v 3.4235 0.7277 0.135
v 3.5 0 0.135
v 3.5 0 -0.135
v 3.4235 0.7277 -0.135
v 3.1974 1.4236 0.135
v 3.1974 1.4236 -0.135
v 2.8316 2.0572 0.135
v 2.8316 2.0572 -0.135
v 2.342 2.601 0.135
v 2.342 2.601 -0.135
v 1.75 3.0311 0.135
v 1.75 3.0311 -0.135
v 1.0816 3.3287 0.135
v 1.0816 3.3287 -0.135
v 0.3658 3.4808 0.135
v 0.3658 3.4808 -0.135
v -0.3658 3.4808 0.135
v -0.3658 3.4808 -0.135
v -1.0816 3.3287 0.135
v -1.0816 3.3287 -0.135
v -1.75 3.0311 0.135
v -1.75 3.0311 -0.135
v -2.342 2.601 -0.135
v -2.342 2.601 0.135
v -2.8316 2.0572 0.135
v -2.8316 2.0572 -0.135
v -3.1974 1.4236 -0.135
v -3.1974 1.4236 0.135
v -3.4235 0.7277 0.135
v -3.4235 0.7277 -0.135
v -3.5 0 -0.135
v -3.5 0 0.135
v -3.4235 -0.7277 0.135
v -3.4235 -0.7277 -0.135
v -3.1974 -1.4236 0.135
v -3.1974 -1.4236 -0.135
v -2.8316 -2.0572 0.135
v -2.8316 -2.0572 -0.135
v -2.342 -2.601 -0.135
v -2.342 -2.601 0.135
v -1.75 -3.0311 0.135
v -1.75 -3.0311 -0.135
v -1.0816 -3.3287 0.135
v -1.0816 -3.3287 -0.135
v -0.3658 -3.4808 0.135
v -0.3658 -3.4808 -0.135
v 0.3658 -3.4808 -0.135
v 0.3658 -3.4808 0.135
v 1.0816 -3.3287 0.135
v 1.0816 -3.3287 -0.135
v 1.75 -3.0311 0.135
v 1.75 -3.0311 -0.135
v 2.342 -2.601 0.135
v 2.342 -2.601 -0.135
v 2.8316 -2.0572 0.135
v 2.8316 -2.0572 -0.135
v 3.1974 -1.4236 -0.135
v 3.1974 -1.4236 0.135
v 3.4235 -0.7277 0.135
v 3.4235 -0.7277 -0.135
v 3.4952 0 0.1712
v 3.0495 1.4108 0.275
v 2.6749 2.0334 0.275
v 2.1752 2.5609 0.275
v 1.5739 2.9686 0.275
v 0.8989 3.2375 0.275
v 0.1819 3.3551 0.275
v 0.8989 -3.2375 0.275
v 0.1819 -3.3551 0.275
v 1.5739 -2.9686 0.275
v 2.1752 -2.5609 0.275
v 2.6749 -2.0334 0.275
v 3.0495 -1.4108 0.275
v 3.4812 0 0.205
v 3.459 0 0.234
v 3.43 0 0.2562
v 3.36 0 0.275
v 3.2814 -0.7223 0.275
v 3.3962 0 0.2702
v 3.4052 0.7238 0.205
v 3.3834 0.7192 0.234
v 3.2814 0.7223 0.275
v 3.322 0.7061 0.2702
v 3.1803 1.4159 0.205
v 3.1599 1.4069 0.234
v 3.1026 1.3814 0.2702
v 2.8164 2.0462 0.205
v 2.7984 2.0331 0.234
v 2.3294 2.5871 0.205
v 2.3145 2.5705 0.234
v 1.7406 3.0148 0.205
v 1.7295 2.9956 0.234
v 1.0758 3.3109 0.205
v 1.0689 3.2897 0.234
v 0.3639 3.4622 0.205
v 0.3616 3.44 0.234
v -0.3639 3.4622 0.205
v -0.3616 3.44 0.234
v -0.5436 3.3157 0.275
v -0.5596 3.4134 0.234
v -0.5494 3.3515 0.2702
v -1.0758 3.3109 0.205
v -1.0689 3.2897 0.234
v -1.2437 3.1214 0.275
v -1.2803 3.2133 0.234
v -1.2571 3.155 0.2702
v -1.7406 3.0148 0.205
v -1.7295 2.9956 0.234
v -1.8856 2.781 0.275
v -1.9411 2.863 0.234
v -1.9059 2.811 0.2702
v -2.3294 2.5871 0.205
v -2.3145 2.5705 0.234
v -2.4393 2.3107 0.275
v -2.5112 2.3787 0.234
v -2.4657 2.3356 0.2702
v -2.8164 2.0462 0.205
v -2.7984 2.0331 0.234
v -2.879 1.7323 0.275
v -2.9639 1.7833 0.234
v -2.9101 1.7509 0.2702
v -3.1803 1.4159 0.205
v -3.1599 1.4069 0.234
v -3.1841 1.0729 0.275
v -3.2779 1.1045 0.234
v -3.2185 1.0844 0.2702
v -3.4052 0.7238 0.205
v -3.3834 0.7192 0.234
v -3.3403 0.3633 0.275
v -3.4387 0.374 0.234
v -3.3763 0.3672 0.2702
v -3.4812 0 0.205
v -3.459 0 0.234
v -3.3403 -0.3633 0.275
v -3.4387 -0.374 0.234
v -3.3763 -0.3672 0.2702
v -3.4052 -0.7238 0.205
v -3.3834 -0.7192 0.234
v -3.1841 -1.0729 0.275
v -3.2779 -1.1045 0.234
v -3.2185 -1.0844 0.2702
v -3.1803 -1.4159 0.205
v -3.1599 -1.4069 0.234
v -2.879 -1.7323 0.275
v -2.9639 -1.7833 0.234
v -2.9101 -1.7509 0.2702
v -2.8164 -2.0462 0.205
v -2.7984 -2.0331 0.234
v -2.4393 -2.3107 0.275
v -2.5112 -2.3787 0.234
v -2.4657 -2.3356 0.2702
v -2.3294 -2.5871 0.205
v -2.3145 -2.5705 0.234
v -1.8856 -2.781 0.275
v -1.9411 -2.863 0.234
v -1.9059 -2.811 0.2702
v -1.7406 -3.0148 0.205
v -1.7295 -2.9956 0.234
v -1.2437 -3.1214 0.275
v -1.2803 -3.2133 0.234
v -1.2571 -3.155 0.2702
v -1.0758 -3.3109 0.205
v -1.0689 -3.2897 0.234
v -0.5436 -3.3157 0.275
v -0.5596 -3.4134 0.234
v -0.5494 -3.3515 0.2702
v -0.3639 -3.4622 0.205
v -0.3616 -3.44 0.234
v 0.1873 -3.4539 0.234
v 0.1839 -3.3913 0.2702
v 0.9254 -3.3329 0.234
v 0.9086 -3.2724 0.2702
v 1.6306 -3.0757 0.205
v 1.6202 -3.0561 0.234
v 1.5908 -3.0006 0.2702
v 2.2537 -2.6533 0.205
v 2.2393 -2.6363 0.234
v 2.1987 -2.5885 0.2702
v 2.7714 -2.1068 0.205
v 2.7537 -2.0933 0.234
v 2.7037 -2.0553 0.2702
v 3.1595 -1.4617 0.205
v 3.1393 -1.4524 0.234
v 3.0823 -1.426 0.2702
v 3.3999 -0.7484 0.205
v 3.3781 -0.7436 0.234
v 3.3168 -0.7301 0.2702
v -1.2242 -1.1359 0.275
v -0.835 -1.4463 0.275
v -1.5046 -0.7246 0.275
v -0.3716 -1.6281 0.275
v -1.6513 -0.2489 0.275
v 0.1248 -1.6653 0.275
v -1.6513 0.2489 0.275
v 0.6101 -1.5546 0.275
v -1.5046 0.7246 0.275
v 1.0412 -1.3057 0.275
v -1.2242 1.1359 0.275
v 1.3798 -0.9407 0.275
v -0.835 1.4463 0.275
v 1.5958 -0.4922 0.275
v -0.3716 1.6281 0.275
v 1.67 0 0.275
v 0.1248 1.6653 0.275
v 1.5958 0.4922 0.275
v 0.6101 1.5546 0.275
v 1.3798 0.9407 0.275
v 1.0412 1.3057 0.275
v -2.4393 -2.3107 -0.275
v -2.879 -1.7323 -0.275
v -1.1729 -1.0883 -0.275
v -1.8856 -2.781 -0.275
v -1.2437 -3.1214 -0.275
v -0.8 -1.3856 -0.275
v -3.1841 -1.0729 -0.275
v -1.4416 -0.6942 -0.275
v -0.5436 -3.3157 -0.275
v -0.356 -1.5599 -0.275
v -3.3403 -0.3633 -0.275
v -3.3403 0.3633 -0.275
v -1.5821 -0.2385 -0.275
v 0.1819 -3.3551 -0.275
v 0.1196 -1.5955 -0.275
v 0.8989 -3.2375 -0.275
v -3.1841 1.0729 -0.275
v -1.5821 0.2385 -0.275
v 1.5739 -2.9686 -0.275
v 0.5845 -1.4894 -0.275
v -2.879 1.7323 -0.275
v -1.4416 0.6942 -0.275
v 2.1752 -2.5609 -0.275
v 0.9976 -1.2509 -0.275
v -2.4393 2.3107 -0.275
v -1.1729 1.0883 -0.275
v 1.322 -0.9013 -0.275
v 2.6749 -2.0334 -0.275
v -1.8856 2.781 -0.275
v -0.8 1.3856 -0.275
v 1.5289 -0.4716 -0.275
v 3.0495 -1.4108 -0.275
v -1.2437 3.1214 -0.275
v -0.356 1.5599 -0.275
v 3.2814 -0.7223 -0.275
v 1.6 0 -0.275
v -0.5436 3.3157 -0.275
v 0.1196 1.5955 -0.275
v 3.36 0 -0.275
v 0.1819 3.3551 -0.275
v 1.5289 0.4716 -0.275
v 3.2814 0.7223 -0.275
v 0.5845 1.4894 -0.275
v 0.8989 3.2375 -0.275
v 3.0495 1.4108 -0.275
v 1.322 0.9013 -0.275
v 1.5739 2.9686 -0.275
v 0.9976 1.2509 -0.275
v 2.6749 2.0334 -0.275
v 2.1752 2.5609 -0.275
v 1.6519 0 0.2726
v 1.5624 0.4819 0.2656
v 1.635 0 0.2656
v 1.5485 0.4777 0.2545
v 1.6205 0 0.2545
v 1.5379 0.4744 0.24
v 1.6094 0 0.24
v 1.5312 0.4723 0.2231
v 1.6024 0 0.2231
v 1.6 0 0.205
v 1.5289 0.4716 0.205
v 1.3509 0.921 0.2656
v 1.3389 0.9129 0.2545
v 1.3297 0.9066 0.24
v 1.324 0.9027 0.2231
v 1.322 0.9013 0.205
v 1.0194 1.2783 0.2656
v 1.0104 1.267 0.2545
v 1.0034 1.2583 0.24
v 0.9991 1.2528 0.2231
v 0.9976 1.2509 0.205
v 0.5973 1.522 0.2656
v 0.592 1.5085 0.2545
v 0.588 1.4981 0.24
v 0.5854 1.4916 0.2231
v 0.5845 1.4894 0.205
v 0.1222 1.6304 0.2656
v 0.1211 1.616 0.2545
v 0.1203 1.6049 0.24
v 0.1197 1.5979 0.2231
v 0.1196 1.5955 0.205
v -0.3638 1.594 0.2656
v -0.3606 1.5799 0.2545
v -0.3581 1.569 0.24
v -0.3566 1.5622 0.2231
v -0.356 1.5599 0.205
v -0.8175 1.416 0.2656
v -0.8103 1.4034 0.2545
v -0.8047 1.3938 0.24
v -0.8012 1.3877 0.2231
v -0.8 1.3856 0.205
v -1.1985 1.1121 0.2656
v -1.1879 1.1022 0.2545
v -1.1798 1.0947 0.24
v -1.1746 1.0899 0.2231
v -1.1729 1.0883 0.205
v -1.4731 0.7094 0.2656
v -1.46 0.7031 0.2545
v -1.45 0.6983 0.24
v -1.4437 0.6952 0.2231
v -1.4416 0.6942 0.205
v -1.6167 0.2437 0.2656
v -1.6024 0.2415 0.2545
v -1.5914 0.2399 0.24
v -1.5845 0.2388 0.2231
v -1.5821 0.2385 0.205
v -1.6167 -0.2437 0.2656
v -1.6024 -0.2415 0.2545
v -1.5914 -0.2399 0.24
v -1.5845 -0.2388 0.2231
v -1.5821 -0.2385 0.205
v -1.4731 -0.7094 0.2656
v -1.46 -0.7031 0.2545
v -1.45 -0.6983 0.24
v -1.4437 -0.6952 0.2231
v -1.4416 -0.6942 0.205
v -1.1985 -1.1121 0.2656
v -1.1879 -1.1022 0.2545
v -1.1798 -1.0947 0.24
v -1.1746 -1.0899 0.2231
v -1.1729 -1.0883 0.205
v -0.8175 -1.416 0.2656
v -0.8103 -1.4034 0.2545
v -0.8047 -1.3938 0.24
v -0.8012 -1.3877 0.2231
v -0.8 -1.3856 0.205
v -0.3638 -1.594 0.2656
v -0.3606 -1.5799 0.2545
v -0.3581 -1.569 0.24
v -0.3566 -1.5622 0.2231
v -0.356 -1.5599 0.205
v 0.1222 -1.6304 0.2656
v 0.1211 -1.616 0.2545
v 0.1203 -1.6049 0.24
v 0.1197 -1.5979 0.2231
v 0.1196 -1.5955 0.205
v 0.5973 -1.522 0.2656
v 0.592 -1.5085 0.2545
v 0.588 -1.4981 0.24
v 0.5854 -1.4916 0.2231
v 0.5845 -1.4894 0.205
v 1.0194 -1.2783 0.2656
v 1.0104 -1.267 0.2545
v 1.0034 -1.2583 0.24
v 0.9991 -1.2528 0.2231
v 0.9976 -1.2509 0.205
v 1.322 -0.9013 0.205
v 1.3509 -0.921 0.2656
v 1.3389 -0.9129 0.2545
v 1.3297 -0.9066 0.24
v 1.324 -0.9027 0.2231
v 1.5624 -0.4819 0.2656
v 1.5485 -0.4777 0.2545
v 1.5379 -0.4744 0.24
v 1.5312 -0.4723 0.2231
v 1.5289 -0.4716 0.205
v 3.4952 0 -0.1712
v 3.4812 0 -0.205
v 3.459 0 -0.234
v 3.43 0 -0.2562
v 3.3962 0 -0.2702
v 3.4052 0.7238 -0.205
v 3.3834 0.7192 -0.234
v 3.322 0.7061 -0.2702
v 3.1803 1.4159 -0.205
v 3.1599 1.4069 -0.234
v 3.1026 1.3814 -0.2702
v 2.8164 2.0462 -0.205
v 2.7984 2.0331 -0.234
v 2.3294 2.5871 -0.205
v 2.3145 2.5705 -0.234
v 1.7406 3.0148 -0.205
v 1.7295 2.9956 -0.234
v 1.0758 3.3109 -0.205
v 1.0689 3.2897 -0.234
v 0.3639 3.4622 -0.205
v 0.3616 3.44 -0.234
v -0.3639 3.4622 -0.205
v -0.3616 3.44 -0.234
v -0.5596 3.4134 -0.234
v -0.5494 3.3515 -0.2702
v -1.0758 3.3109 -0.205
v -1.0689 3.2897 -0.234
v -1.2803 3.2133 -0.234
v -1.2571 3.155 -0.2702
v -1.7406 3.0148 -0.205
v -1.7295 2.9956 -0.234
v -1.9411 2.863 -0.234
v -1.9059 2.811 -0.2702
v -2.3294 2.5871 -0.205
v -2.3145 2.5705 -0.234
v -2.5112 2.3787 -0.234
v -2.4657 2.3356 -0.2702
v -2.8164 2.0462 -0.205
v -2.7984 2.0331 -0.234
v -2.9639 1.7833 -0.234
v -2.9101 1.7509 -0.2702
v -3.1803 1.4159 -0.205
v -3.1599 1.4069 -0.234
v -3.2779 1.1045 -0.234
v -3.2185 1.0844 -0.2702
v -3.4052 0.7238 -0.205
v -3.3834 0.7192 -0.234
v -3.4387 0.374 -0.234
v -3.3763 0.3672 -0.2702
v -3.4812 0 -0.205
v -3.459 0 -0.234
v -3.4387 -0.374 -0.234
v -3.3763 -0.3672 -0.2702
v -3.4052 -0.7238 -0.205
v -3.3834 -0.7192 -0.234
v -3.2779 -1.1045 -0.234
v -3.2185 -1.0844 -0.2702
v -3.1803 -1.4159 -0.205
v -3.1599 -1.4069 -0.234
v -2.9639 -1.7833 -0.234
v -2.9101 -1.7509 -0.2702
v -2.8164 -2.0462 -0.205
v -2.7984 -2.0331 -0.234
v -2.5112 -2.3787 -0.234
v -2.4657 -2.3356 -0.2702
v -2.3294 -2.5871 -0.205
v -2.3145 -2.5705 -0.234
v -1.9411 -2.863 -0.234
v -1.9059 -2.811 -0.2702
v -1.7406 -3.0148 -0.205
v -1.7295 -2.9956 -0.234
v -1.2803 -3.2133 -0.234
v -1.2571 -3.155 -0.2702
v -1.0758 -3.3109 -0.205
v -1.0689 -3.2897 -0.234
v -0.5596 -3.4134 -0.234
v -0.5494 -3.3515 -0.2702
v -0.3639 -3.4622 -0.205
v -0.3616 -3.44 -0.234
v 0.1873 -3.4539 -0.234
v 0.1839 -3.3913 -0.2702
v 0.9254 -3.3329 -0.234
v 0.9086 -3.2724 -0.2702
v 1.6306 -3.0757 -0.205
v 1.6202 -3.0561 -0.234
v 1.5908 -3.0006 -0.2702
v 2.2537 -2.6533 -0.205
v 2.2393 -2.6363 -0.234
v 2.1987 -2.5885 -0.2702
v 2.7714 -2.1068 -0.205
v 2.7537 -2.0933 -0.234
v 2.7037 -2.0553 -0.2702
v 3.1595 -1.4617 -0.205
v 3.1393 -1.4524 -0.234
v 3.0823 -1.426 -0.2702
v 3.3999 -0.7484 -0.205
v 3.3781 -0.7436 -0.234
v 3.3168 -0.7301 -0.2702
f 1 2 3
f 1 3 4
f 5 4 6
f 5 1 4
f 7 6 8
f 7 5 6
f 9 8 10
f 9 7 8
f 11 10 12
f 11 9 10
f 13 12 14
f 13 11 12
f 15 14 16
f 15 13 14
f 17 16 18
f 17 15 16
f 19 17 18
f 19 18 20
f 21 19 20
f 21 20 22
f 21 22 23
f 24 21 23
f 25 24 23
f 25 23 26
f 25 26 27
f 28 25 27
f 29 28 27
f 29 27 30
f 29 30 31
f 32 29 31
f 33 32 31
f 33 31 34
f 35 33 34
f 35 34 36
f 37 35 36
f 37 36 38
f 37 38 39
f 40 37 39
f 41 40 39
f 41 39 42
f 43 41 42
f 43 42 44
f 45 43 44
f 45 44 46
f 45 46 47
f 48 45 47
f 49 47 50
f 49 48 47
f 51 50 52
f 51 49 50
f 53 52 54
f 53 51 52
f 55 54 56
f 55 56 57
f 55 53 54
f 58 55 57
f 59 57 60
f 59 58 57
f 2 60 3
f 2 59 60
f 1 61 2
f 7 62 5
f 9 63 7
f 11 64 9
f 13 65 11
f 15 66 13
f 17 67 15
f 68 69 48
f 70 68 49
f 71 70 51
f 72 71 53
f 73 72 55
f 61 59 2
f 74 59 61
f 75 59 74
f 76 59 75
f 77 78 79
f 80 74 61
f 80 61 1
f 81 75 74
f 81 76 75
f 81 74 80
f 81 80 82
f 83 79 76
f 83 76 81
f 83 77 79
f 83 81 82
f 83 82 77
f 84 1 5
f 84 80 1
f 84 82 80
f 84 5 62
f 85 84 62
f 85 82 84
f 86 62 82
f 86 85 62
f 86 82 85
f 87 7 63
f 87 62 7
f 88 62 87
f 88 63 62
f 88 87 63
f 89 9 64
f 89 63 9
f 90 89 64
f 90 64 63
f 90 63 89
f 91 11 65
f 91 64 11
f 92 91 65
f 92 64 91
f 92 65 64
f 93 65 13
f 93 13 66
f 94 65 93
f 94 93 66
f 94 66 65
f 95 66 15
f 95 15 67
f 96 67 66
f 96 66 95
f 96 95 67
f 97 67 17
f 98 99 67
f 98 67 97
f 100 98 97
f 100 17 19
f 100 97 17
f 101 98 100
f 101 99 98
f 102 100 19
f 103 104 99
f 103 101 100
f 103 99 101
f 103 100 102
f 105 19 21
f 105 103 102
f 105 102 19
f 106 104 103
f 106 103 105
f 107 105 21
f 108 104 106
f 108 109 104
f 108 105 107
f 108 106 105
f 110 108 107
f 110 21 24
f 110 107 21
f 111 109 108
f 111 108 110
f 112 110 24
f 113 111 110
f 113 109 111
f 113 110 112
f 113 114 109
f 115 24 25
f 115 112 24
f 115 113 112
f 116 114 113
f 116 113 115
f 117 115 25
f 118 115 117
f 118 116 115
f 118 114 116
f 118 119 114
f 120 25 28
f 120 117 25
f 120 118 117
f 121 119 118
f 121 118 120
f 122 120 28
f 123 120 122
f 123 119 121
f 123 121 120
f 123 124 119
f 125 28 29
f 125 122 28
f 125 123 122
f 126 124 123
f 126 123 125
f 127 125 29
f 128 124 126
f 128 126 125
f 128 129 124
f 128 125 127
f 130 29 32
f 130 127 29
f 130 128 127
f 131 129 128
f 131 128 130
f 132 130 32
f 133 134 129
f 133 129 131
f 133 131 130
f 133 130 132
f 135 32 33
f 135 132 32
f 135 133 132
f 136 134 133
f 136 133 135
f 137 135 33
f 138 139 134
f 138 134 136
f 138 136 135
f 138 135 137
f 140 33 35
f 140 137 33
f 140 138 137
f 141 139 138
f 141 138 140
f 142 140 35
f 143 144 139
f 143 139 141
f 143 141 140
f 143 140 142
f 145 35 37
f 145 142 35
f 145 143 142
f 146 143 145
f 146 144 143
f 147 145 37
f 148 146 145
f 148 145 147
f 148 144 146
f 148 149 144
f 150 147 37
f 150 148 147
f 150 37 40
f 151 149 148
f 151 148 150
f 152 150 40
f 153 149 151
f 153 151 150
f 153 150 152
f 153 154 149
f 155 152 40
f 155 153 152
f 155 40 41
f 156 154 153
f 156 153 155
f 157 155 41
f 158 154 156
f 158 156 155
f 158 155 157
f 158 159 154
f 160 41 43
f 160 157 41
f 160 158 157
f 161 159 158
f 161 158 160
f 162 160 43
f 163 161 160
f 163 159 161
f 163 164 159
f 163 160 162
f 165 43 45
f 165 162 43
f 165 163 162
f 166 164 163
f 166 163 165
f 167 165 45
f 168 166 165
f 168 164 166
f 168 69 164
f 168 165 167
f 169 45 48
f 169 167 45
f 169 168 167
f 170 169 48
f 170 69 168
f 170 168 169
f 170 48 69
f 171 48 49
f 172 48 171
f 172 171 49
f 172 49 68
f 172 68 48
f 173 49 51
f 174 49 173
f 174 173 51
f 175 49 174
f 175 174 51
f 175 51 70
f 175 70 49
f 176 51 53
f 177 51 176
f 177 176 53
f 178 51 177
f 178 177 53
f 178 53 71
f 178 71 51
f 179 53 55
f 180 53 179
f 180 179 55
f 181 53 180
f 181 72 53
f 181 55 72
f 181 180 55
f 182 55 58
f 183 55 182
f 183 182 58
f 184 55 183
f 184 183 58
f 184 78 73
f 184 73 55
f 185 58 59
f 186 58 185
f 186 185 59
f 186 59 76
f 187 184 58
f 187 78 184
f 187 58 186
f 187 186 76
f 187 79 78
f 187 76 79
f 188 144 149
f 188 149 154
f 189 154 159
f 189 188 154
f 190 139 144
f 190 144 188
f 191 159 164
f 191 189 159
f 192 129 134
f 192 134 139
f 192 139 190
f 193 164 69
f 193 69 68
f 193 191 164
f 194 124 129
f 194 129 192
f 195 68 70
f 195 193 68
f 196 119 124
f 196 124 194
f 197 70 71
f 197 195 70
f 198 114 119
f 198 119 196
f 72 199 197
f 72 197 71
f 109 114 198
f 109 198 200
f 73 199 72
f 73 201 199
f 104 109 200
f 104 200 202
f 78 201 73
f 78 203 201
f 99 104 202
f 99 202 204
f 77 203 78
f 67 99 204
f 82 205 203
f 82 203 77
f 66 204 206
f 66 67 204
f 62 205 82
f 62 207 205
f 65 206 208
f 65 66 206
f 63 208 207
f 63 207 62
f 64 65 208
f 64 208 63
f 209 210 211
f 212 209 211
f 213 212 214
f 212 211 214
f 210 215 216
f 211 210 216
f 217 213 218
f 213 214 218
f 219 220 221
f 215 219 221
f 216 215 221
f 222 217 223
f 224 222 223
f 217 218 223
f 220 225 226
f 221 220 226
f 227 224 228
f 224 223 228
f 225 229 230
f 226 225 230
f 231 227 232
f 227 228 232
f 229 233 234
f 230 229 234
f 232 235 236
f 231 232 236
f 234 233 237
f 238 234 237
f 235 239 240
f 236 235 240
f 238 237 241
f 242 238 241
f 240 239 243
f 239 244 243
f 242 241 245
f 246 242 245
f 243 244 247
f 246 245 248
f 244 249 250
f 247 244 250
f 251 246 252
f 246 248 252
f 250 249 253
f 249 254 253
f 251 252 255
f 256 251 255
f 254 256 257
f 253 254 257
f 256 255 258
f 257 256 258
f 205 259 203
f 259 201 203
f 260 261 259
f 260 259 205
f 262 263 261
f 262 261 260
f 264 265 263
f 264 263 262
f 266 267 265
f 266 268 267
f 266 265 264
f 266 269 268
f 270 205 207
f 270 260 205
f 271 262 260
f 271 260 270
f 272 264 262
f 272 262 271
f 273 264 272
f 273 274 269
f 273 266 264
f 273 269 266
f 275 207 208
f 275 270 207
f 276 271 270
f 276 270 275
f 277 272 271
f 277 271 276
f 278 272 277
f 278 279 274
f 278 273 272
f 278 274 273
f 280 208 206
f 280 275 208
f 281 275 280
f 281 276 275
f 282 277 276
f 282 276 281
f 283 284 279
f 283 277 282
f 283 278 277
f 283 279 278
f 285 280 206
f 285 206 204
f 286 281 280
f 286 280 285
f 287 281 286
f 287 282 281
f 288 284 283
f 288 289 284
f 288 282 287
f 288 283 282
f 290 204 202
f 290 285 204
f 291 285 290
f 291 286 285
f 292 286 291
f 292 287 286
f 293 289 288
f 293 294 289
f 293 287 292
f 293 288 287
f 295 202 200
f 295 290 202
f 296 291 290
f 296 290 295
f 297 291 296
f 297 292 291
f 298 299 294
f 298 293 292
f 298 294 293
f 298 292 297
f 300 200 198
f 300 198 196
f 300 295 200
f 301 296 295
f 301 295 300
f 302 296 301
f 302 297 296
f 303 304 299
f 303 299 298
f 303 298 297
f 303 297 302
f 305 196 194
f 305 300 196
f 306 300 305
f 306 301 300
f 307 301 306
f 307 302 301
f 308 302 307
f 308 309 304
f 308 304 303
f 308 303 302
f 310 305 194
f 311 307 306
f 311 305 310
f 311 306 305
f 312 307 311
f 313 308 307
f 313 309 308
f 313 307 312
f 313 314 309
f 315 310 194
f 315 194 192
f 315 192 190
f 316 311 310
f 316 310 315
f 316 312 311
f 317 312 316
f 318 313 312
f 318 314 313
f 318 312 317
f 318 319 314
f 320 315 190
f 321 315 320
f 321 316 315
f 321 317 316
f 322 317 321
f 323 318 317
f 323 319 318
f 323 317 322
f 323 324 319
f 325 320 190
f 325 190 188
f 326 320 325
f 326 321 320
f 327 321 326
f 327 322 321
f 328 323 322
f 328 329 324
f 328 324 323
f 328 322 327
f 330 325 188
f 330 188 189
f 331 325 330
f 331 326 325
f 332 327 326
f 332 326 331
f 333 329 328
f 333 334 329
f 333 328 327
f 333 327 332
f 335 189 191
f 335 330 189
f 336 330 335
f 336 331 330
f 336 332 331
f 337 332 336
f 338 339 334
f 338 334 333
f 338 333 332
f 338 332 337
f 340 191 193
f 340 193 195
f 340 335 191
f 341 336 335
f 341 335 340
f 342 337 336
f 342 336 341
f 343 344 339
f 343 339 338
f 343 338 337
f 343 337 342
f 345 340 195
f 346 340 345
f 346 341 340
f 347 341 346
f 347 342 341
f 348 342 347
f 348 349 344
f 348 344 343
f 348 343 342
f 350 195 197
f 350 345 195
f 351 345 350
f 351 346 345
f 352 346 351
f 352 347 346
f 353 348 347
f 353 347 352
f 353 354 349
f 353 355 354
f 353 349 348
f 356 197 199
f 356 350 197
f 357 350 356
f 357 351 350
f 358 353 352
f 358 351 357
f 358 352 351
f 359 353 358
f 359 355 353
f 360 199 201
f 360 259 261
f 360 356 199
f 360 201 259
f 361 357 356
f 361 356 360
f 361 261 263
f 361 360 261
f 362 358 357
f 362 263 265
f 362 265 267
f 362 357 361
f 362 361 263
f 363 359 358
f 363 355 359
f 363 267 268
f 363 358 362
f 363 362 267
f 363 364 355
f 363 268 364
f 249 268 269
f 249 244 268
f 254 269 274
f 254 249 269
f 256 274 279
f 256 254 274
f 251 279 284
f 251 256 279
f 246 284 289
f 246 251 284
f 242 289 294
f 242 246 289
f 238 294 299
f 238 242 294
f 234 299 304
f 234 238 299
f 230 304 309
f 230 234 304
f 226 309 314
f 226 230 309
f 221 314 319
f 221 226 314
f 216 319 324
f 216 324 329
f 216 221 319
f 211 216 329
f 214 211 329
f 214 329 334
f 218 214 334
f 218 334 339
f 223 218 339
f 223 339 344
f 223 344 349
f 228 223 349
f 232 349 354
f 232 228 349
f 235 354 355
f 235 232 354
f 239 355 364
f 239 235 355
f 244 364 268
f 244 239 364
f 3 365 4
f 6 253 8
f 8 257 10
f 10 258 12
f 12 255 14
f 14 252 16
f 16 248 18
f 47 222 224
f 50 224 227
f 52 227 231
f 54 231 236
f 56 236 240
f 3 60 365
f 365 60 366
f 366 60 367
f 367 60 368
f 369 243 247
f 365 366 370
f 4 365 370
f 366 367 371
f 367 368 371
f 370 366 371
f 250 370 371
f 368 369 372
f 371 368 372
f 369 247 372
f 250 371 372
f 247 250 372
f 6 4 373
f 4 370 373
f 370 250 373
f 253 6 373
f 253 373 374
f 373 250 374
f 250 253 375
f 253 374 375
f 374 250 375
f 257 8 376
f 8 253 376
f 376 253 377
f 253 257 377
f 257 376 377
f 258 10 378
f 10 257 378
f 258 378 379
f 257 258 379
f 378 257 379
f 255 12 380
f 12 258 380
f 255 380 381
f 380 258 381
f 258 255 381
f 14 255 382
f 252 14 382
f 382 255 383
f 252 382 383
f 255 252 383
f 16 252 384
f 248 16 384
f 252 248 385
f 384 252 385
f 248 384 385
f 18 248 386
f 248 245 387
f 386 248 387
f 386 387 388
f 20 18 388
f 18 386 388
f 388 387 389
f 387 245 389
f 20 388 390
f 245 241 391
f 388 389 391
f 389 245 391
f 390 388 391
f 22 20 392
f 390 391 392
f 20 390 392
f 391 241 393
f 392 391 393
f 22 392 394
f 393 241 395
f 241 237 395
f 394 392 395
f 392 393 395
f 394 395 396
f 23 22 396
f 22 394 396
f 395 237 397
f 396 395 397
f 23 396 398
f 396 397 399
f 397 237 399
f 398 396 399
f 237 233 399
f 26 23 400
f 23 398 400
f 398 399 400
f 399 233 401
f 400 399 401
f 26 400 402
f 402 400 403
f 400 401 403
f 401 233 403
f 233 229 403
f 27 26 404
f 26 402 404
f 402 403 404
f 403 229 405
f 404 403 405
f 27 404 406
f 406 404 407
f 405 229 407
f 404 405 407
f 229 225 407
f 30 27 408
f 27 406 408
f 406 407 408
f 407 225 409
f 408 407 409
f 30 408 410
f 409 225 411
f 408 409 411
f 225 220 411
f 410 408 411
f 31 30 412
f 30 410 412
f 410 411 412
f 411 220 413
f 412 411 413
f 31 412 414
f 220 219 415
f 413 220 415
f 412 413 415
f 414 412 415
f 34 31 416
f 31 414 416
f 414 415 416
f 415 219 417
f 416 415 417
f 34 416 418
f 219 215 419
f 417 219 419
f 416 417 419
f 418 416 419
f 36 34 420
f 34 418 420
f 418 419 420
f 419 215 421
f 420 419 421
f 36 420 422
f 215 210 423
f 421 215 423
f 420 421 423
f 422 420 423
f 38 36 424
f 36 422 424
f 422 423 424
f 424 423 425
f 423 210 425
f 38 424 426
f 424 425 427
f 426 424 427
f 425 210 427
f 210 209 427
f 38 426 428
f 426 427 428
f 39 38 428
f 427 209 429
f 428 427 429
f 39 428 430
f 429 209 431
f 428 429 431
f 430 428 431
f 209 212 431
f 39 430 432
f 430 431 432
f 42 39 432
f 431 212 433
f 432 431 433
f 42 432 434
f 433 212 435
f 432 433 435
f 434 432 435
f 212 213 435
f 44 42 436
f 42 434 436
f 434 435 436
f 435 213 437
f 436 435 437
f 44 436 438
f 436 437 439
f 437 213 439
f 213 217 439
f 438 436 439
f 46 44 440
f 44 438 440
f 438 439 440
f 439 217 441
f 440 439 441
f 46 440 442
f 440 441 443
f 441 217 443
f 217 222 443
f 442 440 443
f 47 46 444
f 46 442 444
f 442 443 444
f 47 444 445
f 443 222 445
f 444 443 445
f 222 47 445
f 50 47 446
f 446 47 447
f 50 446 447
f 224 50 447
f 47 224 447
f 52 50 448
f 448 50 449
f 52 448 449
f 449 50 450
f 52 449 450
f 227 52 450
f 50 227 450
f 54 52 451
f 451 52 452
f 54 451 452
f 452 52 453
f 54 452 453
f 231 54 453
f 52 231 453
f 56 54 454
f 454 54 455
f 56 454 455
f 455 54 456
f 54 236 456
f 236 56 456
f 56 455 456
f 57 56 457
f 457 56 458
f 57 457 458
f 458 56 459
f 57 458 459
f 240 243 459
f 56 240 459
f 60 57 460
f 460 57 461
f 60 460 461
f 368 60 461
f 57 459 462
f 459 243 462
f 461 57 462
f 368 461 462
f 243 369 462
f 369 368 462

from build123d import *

# Parameters (mm, degrees)
SKETCH3_R                = 3.5
SKETCH3_R_2              = 1.6
BOSS_EXTRUDE1_DEPTH      = 0.275
BOSS_EXTRUDE1_DEPTH_BACK = 0.275
FILLET1_R                = 0.14
FILLET2_R                = 0.07


with BuildPart() as part:
    # Sketch3 → Boss-Extrude1 (new body, two sides)
    with BuildSketch(Plane.XY) as boss_extrude1_sk:
        Circle(SKETCH3_R)
        Circle(SKETCH3_R_2, mode=Mode.SUBTRACT)
    extrude(amount=BOSS_EXTRUDE1_DEPTH)
    extrude(boss_extrude1_sk.sketch, amount=-BOSS_EXTRUDE1_DEPTH_BACK)

    # Fillet1
    fillet1_edges = [part.edges().sort_by_distance(p)[0] for p in [
        (-3.5, 0, -0.275),
        (-3.5, 0, 0.275),
    ]]
    fillet(fillet1_edges, radius=FILLET1_R)

    # Fillet2
    fillet2_edges = [part.edges().sort_by_distance(p)[0] for p in [
        (-1.6, 0, 0.275),
    ]]
    fillet(fillet2_edges, radius=FILLET2_R)


solid = part.part
